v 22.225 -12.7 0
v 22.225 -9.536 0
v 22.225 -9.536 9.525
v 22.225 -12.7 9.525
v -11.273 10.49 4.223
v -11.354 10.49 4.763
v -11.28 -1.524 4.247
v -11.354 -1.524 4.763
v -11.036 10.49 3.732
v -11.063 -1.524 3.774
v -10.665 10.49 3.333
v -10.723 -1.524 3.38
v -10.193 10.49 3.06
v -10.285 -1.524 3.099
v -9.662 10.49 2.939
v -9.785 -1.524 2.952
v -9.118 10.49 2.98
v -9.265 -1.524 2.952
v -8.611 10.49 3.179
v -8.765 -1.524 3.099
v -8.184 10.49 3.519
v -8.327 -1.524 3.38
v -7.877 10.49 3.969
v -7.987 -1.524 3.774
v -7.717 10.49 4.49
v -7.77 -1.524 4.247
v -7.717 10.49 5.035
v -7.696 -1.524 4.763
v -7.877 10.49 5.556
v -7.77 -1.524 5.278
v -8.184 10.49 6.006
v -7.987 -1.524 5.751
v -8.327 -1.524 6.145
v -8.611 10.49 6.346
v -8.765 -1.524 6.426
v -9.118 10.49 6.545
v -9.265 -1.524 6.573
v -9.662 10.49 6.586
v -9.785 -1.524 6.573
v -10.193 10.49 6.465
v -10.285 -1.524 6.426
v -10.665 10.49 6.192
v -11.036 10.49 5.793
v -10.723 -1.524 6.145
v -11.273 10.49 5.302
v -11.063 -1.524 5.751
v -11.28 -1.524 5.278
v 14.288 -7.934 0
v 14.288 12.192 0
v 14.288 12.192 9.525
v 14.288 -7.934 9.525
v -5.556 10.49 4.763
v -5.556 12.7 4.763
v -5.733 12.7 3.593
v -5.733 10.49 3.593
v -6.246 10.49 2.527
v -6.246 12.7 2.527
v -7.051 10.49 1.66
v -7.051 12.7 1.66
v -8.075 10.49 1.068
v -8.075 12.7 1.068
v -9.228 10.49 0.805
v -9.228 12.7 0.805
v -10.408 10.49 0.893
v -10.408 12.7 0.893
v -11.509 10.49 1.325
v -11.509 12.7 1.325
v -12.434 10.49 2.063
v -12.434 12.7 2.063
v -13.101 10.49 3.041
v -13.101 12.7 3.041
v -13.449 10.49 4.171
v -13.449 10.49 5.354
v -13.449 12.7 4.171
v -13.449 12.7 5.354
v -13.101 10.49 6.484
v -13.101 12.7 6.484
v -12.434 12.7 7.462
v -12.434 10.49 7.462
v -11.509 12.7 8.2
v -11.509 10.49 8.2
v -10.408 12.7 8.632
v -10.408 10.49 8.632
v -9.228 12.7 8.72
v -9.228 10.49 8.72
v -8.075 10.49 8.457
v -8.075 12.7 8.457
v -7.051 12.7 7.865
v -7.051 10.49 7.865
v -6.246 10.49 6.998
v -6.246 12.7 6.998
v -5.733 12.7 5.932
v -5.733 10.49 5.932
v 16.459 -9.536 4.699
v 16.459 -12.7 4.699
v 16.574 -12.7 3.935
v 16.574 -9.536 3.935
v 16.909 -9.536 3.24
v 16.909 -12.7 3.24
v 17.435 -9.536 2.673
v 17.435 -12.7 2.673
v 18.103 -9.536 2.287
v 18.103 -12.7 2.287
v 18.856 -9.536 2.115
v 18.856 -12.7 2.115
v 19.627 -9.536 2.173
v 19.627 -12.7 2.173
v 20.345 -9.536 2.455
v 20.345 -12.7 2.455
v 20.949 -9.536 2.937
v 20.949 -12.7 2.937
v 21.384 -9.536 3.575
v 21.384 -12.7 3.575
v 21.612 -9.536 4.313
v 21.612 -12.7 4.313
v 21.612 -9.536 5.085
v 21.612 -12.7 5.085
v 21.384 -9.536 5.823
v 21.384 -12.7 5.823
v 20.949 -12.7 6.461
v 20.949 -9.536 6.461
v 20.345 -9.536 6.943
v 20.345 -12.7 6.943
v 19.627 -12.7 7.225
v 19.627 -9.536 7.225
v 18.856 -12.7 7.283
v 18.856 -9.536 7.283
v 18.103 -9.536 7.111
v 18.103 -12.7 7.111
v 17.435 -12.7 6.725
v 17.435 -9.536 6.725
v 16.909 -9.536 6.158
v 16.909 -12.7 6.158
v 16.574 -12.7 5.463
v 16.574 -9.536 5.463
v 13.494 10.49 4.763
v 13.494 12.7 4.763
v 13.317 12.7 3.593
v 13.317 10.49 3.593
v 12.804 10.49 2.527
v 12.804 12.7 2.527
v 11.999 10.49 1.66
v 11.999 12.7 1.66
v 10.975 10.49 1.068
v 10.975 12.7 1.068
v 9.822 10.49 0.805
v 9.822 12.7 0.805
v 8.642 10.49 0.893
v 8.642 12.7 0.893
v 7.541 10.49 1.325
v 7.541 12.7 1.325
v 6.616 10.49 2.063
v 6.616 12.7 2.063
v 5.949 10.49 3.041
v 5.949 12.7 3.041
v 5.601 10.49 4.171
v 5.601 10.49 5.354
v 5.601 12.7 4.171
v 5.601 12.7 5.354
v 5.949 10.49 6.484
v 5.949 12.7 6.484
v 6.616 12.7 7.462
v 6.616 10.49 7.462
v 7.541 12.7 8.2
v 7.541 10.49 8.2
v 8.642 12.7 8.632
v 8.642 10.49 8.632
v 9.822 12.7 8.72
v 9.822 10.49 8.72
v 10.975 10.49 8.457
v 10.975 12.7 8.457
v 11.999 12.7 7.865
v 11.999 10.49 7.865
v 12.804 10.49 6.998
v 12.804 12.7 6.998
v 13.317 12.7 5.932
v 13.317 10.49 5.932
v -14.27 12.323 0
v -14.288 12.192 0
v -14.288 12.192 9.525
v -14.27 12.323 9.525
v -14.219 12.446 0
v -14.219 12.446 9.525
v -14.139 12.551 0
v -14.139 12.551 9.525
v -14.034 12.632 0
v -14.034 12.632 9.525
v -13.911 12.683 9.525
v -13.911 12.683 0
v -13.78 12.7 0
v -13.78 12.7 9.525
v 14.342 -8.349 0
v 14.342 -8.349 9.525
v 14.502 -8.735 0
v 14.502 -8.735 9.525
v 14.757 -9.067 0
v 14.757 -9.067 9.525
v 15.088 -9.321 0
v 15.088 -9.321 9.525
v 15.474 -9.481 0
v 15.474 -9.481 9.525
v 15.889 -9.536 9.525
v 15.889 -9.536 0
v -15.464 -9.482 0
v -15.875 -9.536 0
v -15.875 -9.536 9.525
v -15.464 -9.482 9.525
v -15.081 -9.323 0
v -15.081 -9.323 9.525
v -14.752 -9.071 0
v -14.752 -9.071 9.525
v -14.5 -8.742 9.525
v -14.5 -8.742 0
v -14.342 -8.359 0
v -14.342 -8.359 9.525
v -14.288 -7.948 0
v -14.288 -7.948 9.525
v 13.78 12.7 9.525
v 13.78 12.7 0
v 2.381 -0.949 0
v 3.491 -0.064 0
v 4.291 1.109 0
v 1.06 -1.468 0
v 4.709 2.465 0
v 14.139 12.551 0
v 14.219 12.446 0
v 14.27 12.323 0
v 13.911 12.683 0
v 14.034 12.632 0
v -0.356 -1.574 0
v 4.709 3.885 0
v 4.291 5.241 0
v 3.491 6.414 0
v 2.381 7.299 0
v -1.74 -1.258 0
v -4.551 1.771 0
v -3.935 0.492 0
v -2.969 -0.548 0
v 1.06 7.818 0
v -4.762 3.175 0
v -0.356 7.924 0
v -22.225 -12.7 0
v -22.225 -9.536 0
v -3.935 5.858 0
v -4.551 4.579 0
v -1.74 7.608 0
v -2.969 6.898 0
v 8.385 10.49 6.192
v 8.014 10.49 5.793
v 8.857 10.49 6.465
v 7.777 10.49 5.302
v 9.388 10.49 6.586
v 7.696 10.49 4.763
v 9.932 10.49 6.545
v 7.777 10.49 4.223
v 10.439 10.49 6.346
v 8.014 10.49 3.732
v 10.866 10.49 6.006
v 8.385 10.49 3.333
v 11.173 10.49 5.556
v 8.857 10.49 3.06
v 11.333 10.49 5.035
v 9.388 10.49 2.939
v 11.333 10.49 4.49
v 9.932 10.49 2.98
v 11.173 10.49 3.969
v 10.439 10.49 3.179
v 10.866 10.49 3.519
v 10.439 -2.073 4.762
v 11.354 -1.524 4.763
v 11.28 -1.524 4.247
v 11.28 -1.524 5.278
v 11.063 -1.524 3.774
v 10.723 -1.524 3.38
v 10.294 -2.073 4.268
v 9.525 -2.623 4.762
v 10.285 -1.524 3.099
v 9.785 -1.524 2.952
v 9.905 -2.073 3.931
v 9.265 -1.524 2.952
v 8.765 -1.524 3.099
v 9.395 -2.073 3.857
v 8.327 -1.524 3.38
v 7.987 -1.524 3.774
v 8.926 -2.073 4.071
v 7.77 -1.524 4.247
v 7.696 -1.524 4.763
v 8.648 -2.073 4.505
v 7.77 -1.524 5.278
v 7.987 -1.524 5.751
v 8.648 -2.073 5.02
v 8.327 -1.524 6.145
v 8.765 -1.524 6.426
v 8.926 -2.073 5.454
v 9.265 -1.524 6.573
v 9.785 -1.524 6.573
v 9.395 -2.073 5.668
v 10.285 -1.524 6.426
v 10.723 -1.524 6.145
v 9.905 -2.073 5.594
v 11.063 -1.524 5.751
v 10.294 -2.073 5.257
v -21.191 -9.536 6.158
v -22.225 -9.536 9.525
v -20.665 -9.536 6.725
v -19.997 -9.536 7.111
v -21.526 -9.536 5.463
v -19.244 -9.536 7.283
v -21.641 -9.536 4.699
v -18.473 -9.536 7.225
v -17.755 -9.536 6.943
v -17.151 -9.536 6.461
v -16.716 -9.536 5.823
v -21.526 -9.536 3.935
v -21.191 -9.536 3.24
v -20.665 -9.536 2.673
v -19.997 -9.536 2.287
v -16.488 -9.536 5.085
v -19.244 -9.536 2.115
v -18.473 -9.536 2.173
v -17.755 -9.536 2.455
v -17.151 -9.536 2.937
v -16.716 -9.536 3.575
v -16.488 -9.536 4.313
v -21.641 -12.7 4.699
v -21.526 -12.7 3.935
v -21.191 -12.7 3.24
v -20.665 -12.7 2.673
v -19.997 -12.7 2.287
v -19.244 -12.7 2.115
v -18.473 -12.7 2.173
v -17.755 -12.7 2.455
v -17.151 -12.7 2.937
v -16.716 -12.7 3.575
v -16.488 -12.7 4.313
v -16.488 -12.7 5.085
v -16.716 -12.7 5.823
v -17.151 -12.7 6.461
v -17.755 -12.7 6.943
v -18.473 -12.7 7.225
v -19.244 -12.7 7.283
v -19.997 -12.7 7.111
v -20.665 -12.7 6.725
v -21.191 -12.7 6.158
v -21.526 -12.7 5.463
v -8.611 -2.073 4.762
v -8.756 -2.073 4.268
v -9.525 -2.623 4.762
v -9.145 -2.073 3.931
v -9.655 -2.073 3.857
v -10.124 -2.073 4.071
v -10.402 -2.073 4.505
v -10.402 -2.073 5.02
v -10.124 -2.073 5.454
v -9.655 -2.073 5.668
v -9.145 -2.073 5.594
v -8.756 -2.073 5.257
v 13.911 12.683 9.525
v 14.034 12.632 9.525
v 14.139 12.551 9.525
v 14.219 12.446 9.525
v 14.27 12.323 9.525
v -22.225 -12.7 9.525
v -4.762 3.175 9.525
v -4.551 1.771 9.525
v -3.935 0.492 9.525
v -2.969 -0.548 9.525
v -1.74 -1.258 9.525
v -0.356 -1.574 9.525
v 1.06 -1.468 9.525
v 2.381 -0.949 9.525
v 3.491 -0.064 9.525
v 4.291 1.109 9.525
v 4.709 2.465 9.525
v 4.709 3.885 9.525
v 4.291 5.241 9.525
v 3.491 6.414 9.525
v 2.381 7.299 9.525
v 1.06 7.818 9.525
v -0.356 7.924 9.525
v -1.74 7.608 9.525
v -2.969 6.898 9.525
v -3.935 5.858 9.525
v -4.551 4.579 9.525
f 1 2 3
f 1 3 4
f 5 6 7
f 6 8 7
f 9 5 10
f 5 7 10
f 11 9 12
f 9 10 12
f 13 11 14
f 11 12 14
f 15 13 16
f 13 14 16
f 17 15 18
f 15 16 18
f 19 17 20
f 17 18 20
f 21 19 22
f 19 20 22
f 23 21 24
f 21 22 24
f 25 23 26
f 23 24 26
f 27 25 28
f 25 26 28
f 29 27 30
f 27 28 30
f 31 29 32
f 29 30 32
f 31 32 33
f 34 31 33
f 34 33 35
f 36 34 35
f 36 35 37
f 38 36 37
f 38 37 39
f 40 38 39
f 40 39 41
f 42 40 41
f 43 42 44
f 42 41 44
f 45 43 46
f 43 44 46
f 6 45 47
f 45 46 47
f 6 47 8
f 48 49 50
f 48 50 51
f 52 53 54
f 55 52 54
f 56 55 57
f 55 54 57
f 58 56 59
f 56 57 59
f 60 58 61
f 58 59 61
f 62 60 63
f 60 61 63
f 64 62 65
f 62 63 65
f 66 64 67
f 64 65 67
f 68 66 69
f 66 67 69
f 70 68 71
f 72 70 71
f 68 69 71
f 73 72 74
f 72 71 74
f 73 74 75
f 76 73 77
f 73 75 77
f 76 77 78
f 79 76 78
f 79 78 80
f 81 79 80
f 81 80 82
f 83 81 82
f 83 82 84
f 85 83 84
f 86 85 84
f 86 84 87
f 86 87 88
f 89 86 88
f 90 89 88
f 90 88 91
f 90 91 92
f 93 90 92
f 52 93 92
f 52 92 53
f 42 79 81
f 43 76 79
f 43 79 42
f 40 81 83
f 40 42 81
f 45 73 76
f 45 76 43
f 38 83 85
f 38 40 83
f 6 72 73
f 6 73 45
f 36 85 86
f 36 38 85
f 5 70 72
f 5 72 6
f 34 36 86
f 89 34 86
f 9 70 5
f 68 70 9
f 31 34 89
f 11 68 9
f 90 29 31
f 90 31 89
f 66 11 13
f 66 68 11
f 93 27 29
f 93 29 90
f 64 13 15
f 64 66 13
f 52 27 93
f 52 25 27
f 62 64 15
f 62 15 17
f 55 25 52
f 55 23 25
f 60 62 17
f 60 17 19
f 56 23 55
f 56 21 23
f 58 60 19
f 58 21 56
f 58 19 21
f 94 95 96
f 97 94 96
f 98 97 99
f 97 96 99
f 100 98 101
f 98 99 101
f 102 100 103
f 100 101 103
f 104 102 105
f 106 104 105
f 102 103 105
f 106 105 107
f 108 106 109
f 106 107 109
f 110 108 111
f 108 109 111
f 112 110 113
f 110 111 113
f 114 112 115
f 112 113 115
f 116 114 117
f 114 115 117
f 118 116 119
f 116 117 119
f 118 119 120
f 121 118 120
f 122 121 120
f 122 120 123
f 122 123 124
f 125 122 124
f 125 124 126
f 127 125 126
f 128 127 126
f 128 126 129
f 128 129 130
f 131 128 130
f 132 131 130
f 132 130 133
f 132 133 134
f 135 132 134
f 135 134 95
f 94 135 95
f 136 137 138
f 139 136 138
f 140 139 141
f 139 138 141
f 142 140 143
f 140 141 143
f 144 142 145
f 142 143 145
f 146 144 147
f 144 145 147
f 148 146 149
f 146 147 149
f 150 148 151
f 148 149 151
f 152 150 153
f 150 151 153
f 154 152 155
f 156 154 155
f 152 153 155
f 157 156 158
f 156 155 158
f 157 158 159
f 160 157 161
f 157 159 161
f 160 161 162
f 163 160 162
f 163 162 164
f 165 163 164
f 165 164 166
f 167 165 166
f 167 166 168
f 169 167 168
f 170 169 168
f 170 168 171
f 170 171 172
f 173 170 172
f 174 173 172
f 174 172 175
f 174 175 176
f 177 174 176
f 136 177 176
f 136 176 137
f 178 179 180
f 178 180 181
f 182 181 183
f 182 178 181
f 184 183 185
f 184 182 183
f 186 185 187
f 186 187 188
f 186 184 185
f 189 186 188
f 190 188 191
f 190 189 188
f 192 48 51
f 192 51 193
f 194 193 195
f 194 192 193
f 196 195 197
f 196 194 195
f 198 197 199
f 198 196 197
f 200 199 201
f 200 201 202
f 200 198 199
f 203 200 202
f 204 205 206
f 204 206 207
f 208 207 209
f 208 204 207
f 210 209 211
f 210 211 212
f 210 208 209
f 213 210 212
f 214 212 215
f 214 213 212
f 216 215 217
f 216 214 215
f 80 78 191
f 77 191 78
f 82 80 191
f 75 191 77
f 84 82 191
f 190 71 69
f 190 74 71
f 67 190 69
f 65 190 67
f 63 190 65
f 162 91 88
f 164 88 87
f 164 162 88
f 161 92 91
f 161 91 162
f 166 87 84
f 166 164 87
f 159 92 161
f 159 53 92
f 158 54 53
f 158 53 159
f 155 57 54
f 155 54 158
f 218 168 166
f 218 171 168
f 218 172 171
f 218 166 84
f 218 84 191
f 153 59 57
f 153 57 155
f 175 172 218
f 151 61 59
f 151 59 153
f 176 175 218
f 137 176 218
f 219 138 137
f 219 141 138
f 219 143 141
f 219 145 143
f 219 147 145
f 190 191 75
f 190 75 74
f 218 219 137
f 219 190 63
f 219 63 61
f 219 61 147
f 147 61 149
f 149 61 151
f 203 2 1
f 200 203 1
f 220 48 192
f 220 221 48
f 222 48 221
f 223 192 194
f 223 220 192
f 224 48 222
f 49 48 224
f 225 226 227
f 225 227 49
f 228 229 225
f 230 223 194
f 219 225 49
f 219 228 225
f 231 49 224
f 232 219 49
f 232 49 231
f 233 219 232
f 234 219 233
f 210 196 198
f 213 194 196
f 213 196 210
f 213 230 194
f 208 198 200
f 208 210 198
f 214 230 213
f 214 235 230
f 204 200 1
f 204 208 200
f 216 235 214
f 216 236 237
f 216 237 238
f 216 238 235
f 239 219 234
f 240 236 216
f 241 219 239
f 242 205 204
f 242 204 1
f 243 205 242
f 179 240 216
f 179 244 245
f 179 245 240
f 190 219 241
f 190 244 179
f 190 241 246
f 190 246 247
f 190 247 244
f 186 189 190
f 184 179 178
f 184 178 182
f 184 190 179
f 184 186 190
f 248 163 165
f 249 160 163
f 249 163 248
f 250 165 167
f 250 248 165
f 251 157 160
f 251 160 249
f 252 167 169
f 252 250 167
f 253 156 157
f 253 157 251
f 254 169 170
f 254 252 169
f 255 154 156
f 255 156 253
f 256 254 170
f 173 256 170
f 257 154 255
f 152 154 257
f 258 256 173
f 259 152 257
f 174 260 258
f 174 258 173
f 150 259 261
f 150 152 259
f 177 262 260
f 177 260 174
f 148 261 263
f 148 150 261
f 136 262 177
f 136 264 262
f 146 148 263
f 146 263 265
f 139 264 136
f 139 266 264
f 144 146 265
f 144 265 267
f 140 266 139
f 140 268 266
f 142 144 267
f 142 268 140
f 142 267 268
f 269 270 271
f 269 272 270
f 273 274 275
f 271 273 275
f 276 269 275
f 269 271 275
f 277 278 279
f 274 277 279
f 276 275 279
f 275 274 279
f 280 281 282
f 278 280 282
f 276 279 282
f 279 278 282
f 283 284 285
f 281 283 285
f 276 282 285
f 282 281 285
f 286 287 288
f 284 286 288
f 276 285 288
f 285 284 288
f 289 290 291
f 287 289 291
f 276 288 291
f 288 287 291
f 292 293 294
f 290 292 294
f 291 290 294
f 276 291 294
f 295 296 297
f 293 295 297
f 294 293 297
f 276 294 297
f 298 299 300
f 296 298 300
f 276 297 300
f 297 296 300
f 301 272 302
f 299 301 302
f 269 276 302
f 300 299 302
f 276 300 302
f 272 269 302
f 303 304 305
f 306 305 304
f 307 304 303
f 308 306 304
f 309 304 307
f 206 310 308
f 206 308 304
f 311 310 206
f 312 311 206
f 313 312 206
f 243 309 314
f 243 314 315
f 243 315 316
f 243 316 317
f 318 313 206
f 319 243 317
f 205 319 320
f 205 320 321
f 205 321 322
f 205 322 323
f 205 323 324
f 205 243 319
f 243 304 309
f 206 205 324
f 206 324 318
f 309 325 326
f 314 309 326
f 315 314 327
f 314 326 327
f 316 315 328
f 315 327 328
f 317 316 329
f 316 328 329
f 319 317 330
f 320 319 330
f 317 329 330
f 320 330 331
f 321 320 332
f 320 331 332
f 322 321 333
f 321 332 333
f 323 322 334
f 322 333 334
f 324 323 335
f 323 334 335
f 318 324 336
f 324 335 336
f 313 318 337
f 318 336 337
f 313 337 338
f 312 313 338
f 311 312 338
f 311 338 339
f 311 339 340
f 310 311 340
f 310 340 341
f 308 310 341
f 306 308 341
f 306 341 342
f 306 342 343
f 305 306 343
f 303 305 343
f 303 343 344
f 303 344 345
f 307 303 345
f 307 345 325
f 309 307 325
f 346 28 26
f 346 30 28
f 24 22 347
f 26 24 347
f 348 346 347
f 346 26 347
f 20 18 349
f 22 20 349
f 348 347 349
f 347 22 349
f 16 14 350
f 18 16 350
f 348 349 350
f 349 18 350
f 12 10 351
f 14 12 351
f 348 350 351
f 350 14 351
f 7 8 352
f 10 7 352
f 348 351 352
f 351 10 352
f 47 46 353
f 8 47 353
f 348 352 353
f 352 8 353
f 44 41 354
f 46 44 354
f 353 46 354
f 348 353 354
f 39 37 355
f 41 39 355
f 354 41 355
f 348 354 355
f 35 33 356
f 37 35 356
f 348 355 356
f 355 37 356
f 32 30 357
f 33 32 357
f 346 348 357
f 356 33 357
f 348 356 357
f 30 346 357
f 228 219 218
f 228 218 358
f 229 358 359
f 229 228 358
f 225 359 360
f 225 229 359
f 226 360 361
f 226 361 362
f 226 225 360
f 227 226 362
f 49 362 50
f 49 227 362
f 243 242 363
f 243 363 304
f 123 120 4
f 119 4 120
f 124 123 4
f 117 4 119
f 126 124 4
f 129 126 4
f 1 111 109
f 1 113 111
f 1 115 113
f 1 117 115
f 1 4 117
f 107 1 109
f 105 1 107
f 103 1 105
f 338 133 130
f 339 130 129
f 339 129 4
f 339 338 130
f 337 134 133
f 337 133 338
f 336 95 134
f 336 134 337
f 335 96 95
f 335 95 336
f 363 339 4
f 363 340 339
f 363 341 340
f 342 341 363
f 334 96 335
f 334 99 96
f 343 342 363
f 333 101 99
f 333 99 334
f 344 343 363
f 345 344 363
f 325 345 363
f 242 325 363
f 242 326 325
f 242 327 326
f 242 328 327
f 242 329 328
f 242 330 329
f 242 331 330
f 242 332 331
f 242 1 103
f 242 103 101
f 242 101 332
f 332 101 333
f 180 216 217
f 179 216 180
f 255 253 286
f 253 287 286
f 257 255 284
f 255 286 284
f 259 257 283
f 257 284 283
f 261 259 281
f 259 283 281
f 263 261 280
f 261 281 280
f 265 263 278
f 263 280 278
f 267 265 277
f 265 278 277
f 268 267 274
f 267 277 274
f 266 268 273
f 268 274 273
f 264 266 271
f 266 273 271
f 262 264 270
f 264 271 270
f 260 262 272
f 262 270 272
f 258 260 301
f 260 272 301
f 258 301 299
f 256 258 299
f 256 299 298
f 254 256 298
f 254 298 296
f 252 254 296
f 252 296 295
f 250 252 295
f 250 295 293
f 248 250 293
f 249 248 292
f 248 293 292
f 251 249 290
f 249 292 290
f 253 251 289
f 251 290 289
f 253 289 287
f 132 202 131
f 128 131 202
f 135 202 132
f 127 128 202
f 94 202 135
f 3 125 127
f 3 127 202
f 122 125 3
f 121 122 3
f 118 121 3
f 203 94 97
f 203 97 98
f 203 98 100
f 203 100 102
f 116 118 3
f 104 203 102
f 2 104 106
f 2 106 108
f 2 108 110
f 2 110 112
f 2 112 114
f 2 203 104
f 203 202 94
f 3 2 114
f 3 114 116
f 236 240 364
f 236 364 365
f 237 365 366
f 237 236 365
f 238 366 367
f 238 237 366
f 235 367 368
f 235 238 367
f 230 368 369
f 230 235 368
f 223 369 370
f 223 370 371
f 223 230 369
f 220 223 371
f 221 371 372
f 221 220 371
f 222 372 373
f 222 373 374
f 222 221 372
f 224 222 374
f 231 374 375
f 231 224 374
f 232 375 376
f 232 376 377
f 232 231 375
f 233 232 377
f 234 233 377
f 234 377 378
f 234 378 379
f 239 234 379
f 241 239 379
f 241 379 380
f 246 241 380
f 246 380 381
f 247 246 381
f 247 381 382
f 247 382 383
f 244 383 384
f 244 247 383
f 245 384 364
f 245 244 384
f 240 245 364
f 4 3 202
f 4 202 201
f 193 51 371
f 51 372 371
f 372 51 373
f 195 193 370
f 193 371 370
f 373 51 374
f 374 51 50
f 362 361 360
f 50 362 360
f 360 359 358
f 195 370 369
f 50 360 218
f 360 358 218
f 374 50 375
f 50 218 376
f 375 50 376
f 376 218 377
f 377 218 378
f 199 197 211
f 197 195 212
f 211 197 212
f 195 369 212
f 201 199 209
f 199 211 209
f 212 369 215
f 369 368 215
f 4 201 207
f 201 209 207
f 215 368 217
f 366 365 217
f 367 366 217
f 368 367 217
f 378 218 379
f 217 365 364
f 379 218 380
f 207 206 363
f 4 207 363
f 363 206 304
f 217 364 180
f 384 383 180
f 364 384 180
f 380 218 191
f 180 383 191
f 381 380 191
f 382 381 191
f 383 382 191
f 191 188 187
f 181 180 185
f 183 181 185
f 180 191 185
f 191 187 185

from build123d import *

# Parameters (mm, degrees)
SKETCH1_R                                           = 4.7625
BOSS_EXTRUDE2_DEPTH                                 = 9.525
CBORE_FOR_6_BINDING_HEAD_MACHINE_SCREW1_D           = 3.6576
CBORE_FOR_6_BINDING_HEAD_MACHINE_SCREW1_DEPTH       = 14.224
CBORE_FOR_6_BINDING_HEAD_MACHINE_SCREW1_CBORE_D     = 7.9375
CBORE_FOR_6_BINDING_HEAD_MACHINE_SCREW1_CBORE_DEPTH = 2.2098
CBORE_FOR_6_BINDING_HEAD_MACHINE_SCREW1_TIP         = 1.0988539
F_6_0_204_DIAMETER_HOLE1_D                          = 5.1816


with BuildPart() as part:
    # Sketch1 → Boss-Extrude2 (new body)
    with BuildSketch(Plane.XY):
        with BuildLine():
            Line((22.225, -12.7), (-22.225, -12.7))
            Line((-22.225, -12.7), (-22.225, -9.535669584))
            Line((-22.225, -9.535669584), (-15.875, -9.535669584))
            ThreePointArc((-15.875, -9.535669584), (-14.752467985, -9.070701599), (-14.2875, -7.948169584))
            Line((-14.2875, -7.948169584), (-14.2875, 3.175))
            Line((-14.2875, 3.175), (-14.2875, 12.192))
            ThreePointArc((-14.2875, 12.192), (-14.138710245, 12.551210245), (-13.7795, 12.7))
            Line((-13.7795, 12.7), (13.7795, 12.7))
            ThreePointArc((13.7795, 12.7), (14.138710245, 12.551210245), (14.2875, 12.192))
            Line((14.2875, 12.192), (14.2875, 3.175))
            Line((14.2875, 3.175), (14.2875, -7.934401915))
            ThreePointArc((14.2875, -7.934401915), (14.756500442, -9.066669142), (15.888767669, -9.535669584))
            Line((15.888767669, -9.535669584), (22.225, -9.535669584))
            Line((22.225, -9.535669584), (22.225, -12.7))
        make_face()
        with Locations(Location((0, 3.175, 0), (0, 0, 180))):
            Circle(SKETCH1_R, mode=Mode.SUBTRACT)
    extrude(amount=BOSS_EXTRUDE2_DEPTH)

    # CBORE for #6 Binding Head Machine Screw1
    with Locations(Plane(origin=(0, 12.7, 0), x_dir=(1, 0, 0), z_dir=(0, 1, 0))):
        with Locations((9.525, -4.7625), (-9.525, -4.7625)):
            CounterBoreHole(CBORE_FOR_6_BINDING_HEAD_MACHINE_SCREW1_D / 2, CBORE_FOR_6_BINDING_HEAD_MACHINE_SCREW1_CBORE_D / 2, CBORE_FOR_6_BINDING_HEAD_MACHINE_SCREW1_CBORE_DEPTH, depth=CBORE_FOR_6_BINDING_HEAD_MACHINE_SCREW1_DEPTH)
            with Locations((0, 0, -(CBORE_FOR_6_BINDING_HEAD_MACHINE_SCREW1_DEPTH + CBORE_FOR_6_BINDING_HEAD_MACHINE_SCREW1_TIP / 2))):  # 118° drill point
                Cone(0, CBORE_FOR_6_BINDING_HEAD_MACHINE_SCREW1_D / 2, CBORE_FOR_6_BINDING_HEAD_MACHINE_SCREW1_TIP, mode=Mode.SUBTRACT)

    # #6 (0.204) Diameter Hole1 (through all)
    with Locations(Plane(origin=(0, -9.535669584, 0), x_dir=(1, 0, 0), z_dir=(0, 1, 0))):
        with Locations((-19.05, -4.699018138), (19.05, -4.699018138)):
            Hole(F_6_0_204_DIAMETER_HOLE1_D / 2)


solid = part.part
